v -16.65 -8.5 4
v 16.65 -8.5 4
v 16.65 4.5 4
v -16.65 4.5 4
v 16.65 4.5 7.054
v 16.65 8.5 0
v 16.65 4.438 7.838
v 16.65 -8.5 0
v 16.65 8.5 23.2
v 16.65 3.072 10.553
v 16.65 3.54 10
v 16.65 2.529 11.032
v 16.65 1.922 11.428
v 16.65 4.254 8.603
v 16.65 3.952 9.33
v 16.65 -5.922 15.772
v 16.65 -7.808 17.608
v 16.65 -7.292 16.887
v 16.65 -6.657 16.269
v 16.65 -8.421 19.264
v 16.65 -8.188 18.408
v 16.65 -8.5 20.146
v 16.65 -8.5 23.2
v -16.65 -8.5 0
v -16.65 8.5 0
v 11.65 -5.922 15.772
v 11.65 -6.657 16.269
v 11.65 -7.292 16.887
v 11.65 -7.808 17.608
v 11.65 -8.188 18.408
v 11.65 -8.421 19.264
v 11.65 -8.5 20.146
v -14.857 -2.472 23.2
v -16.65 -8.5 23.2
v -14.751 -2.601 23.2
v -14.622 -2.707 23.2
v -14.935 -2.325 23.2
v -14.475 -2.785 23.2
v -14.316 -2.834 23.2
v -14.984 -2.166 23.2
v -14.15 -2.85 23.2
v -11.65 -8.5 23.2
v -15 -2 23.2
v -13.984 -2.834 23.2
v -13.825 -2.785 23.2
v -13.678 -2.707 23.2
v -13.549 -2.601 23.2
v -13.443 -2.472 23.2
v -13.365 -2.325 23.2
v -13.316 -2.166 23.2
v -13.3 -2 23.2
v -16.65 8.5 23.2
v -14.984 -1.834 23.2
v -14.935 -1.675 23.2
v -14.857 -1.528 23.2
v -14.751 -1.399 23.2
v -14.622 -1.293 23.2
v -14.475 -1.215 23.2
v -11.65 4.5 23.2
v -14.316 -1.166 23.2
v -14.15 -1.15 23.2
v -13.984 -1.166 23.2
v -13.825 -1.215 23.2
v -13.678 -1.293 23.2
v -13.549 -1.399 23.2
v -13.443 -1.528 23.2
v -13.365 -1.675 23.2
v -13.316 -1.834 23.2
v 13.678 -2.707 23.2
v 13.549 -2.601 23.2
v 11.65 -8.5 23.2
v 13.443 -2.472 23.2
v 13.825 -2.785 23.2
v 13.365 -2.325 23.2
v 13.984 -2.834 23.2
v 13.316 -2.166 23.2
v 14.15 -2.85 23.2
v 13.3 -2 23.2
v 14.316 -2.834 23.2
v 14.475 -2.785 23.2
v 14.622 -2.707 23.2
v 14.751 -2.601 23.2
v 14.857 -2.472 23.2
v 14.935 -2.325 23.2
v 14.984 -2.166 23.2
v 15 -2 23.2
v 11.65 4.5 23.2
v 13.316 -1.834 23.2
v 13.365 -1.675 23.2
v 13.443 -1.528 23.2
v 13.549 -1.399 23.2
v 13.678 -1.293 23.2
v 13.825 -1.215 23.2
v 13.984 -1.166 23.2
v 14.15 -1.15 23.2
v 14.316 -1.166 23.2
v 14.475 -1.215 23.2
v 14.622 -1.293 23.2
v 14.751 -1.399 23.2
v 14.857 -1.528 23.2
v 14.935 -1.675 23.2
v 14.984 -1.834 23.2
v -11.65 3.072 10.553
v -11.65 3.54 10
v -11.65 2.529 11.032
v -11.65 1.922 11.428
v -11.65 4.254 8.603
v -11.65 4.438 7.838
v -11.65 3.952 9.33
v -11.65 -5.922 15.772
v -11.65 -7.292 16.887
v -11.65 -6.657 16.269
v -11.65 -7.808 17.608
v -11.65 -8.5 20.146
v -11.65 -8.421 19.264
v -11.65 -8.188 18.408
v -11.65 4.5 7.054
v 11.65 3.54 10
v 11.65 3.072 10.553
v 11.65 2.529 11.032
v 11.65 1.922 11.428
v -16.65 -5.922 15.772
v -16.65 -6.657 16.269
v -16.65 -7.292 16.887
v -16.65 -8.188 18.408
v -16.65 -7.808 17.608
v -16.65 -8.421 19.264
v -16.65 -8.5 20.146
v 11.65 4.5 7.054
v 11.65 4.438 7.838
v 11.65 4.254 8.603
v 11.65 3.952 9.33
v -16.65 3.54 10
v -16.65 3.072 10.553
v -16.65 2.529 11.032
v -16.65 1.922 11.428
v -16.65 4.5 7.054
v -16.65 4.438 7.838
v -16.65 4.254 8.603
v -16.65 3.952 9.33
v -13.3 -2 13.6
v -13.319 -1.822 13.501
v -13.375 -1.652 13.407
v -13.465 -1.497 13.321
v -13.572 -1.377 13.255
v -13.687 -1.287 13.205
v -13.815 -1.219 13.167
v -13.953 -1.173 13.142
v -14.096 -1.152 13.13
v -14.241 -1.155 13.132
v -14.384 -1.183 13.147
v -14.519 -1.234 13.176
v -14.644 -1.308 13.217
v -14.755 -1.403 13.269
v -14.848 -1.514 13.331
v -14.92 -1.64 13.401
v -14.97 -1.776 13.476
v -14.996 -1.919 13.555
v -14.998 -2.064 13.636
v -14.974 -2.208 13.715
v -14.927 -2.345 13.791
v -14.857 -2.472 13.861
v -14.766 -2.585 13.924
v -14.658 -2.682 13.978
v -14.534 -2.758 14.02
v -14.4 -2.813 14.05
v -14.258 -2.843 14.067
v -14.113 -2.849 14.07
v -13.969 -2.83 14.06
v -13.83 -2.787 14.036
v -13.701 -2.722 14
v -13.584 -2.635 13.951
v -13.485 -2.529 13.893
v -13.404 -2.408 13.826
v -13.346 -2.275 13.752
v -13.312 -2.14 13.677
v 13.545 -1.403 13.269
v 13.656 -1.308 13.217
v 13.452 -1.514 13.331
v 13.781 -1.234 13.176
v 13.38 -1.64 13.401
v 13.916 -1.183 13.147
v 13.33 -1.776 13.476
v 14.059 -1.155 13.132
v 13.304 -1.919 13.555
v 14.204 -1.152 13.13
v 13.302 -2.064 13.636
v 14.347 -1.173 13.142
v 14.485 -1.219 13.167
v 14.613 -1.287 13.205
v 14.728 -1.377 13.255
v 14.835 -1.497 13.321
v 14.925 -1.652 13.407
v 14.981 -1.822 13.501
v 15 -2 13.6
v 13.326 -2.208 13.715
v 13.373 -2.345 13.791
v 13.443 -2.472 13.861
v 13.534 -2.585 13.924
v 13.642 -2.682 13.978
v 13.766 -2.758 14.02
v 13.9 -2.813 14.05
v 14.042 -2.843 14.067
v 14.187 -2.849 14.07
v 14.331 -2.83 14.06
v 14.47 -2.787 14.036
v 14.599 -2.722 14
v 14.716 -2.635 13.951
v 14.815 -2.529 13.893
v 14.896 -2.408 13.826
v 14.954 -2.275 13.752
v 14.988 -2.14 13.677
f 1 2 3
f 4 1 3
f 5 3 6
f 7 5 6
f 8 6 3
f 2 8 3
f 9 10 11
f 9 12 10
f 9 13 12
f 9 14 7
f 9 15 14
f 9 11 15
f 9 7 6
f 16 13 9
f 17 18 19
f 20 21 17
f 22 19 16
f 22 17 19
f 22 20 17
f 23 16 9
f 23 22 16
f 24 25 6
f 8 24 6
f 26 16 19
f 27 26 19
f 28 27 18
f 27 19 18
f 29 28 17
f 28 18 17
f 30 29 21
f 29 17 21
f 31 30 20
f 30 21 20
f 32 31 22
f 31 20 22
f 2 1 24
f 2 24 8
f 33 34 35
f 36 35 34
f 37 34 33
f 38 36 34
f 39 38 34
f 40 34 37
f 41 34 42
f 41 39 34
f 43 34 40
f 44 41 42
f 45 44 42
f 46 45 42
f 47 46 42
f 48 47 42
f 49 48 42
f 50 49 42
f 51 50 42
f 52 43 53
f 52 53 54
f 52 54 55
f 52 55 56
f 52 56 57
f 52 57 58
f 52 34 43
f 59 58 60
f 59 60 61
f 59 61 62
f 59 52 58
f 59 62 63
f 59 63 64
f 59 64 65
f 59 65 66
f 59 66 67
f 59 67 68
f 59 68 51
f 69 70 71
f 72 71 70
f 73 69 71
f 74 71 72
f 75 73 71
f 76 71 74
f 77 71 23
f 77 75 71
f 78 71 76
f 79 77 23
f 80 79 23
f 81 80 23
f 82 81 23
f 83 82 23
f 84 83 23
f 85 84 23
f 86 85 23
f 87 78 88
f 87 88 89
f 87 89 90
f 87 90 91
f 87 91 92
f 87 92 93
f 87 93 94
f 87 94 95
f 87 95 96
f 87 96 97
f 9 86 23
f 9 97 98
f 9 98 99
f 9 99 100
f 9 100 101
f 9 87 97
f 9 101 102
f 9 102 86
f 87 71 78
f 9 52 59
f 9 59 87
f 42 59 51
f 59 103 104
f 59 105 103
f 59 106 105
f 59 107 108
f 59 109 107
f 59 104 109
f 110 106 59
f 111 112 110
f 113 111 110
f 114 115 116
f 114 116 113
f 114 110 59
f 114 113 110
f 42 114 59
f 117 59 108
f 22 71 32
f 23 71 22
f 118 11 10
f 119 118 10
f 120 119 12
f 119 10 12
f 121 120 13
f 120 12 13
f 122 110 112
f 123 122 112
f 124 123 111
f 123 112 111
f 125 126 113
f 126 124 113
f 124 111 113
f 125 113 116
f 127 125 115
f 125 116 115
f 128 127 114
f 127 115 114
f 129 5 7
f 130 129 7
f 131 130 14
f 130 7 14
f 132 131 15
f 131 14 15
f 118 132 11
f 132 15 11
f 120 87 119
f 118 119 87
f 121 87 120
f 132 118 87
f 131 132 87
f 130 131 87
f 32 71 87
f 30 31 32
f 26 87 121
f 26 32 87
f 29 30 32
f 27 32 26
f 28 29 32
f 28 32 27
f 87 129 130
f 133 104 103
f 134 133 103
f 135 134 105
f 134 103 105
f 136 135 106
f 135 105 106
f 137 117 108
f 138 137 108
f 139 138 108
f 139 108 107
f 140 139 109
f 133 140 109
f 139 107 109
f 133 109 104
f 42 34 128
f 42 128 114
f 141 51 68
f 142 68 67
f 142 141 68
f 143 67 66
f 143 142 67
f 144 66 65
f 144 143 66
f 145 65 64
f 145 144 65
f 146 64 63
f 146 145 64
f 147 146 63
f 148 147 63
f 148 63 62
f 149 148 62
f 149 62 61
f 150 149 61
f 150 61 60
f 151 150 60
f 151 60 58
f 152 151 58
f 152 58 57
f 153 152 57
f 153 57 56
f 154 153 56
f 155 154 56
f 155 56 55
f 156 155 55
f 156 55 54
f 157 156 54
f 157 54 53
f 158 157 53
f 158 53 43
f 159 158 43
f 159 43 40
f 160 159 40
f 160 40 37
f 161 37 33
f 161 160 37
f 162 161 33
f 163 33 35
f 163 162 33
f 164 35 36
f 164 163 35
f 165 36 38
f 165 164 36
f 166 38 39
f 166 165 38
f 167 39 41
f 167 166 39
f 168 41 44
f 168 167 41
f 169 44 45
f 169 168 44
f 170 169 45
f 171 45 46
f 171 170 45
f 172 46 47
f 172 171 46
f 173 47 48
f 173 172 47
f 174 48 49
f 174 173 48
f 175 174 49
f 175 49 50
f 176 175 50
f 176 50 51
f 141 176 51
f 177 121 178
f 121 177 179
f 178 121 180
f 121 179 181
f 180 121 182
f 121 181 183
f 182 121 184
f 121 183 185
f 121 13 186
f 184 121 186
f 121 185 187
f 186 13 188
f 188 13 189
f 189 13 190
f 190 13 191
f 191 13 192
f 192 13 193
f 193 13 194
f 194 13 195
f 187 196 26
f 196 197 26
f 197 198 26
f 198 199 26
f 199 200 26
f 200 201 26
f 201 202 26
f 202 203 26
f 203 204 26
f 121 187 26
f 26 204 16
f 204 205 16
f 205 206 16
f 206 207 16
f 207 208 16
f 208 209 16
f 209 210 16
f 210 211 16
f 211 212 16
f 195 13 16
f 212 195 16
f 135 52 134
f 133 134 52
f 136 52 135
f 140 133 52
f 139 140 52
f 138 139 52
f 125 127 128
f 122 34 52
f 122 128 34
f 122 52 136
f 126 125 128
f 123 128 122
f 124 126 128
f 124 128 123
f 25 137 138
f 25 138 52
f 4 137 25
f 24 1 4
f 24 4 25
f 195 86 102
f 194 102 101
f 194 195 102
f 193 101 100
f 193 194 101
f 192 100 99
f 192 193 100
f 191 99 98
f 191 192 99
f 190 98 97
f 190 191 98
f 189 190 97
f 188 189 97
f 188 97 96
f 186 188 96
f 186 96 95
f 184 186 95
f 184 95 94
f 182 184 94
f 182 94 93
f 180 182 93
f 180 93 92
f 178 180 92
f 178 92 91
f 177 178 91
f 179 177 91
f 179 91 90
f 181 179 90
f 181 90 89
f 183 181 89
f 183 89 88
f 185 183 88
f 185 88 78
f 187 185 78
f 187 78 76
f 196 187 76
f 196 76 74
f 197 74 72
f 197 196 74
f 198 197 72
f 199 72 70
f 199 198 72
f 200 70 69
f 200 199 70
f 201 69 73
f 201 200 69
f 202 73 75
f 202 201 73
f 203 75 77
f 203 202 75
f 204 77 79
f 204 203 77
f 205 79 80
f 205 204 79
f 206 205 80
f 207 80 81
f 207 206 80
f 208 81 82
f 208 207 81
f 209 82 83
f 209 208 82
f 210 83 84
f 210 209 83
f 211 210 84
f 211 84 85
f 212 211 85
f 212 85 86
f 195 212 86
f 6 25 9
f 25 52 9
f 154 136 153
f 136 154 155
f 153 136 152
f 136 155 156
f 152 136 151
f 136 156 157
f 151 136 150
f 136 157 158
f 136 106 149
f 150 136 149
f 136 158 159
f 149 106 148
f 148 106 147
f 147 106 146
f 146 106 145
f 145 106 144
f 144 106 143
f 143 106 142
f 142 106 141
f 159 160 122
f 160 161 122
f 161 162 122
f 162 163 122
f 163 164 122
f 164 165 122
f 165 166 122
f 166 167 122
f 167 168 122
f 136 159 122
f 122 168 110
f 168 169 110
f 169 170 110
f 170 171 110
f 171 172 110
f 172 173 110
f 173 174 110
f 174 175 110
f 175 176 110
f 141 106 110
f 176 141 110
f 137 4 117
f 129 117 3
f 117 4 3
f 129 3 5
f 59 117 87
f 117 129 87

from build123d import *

# Parameters (mm, degrees)
F1_W     = 5
F1_H     = 7.2
F1_H_2   = 6
F1_H_3   = 4
F1_W_2   = 23.3
F3_DEPTH = 8.5
F0_W     = 23.3
F0_H     = 4
F4_DEPTH = 23.2
F5_DEPTH = 18.1
F6_START = 4.3
F0_R     = 0.85
F6_DEPTH = 20.7


with BuildPart() as f3:
    # F1 (on Front) → F3 (new body, symmetric)
    with BuildSketch(Plane.XZ):
        with Locations((-14.15, 13.6)):
            Rectangle(F1_W, F1_H)
        with Locations((-14.15, 20.2)):
            Rectangle(F1_W, F1_H_2)
        with Locations((-14.15, 7)):
            Rectangle(F1_W, F1_H_2)
        with Locations((-14.15, 2)):
            Rectangle(F1_W, F1_H_3)
        with Locations((0, 2)):
            Rectangle(F1_W_2, F1_H_3)
        with Locations((14.15, 2)):
            Rectangle(F1_W, F1_H_3)
        with Locations((14.15, 7)):
            Rectangle(F1_W, F1_H_2)
        with Locations((14.15, 13.6)):
            Rectangle(F1_W, F1_H)
        with Locations((14.15, 20.2)):
            Rectangle(F1_W, F1_H_2)
    extrude(amount=F3_DEPTH, both=True)

    # F0 (on Top) → F4 (join)
    with BuildSketch(Plane.XY):
        with Locations((0, 6.5)):
            Rectangle(F0_W, F0_H)
    extrude(amount=F4_DEPTH)

    # F2 (on Right) → F5 (cut, symmetric)
    with BuildSketch(Plane.YZ):
        with BuildLine():
            Line((-8.5, 17.2), (-8.5, 10))
            Line((-8.5, 10), (3.5396314061, 10))
            ThreePointArc((3.5396314061, 10), (2.8089650426, 10.8020152096), (1.9224991399, 11.4275389379))
            Line((1.9224991399, 11.4275389379), (-5.9224991399, 15.7724610621))
            ThreePointArc((-5.9224991399, 15.7724610621), (-6.8089650426, 16.3979847904), (-7.5396314061, 17.2))
            Line((-7.5396314061, 17.2), (-8.5, 17.2))
        make_face()
        with BuildLine():
            Line((-8.5, 20.1464178425), (-8.5, 17.2))
            Line((-8.5, 17.2), (-7.5396314061, 17.2))
            ThreePointArc((-7.5396314061, 17.2), (-8.2538488107, 18.5969271247), (-8.5, 20.1464178425))
        make_face()
        with BuildLine():
            Line((-8.5, 10), (-8.5, 4))
            Line((-8.5, 4), (4.5, 4))
            Line((4.5, 4), (4.5, 7.0535821575))
            ThreePointArc((4.5, 7.0535821575), (4.2538488107, 8.6030728753), (3.5396314061, 10))
            Line((3.5396314061, 10), (-8.5, 10))
        make_face()
    extrude(amount=F5_DEPTH, both=True, mode=Mode.SUBTRACT)

    # F0 (on Top) → F6 (cut)
    with BuildSketch(Plane.XY.offset(F6_START)):
        with Locations((14.15, -2)):
            Circle(F0_R)
        with Locations((-14.15, -2)):
            Circle(F0_R)
    extrude(amount=F6_DEPTH, mode=Mode.SUBTRACT)


solid = f3.part
